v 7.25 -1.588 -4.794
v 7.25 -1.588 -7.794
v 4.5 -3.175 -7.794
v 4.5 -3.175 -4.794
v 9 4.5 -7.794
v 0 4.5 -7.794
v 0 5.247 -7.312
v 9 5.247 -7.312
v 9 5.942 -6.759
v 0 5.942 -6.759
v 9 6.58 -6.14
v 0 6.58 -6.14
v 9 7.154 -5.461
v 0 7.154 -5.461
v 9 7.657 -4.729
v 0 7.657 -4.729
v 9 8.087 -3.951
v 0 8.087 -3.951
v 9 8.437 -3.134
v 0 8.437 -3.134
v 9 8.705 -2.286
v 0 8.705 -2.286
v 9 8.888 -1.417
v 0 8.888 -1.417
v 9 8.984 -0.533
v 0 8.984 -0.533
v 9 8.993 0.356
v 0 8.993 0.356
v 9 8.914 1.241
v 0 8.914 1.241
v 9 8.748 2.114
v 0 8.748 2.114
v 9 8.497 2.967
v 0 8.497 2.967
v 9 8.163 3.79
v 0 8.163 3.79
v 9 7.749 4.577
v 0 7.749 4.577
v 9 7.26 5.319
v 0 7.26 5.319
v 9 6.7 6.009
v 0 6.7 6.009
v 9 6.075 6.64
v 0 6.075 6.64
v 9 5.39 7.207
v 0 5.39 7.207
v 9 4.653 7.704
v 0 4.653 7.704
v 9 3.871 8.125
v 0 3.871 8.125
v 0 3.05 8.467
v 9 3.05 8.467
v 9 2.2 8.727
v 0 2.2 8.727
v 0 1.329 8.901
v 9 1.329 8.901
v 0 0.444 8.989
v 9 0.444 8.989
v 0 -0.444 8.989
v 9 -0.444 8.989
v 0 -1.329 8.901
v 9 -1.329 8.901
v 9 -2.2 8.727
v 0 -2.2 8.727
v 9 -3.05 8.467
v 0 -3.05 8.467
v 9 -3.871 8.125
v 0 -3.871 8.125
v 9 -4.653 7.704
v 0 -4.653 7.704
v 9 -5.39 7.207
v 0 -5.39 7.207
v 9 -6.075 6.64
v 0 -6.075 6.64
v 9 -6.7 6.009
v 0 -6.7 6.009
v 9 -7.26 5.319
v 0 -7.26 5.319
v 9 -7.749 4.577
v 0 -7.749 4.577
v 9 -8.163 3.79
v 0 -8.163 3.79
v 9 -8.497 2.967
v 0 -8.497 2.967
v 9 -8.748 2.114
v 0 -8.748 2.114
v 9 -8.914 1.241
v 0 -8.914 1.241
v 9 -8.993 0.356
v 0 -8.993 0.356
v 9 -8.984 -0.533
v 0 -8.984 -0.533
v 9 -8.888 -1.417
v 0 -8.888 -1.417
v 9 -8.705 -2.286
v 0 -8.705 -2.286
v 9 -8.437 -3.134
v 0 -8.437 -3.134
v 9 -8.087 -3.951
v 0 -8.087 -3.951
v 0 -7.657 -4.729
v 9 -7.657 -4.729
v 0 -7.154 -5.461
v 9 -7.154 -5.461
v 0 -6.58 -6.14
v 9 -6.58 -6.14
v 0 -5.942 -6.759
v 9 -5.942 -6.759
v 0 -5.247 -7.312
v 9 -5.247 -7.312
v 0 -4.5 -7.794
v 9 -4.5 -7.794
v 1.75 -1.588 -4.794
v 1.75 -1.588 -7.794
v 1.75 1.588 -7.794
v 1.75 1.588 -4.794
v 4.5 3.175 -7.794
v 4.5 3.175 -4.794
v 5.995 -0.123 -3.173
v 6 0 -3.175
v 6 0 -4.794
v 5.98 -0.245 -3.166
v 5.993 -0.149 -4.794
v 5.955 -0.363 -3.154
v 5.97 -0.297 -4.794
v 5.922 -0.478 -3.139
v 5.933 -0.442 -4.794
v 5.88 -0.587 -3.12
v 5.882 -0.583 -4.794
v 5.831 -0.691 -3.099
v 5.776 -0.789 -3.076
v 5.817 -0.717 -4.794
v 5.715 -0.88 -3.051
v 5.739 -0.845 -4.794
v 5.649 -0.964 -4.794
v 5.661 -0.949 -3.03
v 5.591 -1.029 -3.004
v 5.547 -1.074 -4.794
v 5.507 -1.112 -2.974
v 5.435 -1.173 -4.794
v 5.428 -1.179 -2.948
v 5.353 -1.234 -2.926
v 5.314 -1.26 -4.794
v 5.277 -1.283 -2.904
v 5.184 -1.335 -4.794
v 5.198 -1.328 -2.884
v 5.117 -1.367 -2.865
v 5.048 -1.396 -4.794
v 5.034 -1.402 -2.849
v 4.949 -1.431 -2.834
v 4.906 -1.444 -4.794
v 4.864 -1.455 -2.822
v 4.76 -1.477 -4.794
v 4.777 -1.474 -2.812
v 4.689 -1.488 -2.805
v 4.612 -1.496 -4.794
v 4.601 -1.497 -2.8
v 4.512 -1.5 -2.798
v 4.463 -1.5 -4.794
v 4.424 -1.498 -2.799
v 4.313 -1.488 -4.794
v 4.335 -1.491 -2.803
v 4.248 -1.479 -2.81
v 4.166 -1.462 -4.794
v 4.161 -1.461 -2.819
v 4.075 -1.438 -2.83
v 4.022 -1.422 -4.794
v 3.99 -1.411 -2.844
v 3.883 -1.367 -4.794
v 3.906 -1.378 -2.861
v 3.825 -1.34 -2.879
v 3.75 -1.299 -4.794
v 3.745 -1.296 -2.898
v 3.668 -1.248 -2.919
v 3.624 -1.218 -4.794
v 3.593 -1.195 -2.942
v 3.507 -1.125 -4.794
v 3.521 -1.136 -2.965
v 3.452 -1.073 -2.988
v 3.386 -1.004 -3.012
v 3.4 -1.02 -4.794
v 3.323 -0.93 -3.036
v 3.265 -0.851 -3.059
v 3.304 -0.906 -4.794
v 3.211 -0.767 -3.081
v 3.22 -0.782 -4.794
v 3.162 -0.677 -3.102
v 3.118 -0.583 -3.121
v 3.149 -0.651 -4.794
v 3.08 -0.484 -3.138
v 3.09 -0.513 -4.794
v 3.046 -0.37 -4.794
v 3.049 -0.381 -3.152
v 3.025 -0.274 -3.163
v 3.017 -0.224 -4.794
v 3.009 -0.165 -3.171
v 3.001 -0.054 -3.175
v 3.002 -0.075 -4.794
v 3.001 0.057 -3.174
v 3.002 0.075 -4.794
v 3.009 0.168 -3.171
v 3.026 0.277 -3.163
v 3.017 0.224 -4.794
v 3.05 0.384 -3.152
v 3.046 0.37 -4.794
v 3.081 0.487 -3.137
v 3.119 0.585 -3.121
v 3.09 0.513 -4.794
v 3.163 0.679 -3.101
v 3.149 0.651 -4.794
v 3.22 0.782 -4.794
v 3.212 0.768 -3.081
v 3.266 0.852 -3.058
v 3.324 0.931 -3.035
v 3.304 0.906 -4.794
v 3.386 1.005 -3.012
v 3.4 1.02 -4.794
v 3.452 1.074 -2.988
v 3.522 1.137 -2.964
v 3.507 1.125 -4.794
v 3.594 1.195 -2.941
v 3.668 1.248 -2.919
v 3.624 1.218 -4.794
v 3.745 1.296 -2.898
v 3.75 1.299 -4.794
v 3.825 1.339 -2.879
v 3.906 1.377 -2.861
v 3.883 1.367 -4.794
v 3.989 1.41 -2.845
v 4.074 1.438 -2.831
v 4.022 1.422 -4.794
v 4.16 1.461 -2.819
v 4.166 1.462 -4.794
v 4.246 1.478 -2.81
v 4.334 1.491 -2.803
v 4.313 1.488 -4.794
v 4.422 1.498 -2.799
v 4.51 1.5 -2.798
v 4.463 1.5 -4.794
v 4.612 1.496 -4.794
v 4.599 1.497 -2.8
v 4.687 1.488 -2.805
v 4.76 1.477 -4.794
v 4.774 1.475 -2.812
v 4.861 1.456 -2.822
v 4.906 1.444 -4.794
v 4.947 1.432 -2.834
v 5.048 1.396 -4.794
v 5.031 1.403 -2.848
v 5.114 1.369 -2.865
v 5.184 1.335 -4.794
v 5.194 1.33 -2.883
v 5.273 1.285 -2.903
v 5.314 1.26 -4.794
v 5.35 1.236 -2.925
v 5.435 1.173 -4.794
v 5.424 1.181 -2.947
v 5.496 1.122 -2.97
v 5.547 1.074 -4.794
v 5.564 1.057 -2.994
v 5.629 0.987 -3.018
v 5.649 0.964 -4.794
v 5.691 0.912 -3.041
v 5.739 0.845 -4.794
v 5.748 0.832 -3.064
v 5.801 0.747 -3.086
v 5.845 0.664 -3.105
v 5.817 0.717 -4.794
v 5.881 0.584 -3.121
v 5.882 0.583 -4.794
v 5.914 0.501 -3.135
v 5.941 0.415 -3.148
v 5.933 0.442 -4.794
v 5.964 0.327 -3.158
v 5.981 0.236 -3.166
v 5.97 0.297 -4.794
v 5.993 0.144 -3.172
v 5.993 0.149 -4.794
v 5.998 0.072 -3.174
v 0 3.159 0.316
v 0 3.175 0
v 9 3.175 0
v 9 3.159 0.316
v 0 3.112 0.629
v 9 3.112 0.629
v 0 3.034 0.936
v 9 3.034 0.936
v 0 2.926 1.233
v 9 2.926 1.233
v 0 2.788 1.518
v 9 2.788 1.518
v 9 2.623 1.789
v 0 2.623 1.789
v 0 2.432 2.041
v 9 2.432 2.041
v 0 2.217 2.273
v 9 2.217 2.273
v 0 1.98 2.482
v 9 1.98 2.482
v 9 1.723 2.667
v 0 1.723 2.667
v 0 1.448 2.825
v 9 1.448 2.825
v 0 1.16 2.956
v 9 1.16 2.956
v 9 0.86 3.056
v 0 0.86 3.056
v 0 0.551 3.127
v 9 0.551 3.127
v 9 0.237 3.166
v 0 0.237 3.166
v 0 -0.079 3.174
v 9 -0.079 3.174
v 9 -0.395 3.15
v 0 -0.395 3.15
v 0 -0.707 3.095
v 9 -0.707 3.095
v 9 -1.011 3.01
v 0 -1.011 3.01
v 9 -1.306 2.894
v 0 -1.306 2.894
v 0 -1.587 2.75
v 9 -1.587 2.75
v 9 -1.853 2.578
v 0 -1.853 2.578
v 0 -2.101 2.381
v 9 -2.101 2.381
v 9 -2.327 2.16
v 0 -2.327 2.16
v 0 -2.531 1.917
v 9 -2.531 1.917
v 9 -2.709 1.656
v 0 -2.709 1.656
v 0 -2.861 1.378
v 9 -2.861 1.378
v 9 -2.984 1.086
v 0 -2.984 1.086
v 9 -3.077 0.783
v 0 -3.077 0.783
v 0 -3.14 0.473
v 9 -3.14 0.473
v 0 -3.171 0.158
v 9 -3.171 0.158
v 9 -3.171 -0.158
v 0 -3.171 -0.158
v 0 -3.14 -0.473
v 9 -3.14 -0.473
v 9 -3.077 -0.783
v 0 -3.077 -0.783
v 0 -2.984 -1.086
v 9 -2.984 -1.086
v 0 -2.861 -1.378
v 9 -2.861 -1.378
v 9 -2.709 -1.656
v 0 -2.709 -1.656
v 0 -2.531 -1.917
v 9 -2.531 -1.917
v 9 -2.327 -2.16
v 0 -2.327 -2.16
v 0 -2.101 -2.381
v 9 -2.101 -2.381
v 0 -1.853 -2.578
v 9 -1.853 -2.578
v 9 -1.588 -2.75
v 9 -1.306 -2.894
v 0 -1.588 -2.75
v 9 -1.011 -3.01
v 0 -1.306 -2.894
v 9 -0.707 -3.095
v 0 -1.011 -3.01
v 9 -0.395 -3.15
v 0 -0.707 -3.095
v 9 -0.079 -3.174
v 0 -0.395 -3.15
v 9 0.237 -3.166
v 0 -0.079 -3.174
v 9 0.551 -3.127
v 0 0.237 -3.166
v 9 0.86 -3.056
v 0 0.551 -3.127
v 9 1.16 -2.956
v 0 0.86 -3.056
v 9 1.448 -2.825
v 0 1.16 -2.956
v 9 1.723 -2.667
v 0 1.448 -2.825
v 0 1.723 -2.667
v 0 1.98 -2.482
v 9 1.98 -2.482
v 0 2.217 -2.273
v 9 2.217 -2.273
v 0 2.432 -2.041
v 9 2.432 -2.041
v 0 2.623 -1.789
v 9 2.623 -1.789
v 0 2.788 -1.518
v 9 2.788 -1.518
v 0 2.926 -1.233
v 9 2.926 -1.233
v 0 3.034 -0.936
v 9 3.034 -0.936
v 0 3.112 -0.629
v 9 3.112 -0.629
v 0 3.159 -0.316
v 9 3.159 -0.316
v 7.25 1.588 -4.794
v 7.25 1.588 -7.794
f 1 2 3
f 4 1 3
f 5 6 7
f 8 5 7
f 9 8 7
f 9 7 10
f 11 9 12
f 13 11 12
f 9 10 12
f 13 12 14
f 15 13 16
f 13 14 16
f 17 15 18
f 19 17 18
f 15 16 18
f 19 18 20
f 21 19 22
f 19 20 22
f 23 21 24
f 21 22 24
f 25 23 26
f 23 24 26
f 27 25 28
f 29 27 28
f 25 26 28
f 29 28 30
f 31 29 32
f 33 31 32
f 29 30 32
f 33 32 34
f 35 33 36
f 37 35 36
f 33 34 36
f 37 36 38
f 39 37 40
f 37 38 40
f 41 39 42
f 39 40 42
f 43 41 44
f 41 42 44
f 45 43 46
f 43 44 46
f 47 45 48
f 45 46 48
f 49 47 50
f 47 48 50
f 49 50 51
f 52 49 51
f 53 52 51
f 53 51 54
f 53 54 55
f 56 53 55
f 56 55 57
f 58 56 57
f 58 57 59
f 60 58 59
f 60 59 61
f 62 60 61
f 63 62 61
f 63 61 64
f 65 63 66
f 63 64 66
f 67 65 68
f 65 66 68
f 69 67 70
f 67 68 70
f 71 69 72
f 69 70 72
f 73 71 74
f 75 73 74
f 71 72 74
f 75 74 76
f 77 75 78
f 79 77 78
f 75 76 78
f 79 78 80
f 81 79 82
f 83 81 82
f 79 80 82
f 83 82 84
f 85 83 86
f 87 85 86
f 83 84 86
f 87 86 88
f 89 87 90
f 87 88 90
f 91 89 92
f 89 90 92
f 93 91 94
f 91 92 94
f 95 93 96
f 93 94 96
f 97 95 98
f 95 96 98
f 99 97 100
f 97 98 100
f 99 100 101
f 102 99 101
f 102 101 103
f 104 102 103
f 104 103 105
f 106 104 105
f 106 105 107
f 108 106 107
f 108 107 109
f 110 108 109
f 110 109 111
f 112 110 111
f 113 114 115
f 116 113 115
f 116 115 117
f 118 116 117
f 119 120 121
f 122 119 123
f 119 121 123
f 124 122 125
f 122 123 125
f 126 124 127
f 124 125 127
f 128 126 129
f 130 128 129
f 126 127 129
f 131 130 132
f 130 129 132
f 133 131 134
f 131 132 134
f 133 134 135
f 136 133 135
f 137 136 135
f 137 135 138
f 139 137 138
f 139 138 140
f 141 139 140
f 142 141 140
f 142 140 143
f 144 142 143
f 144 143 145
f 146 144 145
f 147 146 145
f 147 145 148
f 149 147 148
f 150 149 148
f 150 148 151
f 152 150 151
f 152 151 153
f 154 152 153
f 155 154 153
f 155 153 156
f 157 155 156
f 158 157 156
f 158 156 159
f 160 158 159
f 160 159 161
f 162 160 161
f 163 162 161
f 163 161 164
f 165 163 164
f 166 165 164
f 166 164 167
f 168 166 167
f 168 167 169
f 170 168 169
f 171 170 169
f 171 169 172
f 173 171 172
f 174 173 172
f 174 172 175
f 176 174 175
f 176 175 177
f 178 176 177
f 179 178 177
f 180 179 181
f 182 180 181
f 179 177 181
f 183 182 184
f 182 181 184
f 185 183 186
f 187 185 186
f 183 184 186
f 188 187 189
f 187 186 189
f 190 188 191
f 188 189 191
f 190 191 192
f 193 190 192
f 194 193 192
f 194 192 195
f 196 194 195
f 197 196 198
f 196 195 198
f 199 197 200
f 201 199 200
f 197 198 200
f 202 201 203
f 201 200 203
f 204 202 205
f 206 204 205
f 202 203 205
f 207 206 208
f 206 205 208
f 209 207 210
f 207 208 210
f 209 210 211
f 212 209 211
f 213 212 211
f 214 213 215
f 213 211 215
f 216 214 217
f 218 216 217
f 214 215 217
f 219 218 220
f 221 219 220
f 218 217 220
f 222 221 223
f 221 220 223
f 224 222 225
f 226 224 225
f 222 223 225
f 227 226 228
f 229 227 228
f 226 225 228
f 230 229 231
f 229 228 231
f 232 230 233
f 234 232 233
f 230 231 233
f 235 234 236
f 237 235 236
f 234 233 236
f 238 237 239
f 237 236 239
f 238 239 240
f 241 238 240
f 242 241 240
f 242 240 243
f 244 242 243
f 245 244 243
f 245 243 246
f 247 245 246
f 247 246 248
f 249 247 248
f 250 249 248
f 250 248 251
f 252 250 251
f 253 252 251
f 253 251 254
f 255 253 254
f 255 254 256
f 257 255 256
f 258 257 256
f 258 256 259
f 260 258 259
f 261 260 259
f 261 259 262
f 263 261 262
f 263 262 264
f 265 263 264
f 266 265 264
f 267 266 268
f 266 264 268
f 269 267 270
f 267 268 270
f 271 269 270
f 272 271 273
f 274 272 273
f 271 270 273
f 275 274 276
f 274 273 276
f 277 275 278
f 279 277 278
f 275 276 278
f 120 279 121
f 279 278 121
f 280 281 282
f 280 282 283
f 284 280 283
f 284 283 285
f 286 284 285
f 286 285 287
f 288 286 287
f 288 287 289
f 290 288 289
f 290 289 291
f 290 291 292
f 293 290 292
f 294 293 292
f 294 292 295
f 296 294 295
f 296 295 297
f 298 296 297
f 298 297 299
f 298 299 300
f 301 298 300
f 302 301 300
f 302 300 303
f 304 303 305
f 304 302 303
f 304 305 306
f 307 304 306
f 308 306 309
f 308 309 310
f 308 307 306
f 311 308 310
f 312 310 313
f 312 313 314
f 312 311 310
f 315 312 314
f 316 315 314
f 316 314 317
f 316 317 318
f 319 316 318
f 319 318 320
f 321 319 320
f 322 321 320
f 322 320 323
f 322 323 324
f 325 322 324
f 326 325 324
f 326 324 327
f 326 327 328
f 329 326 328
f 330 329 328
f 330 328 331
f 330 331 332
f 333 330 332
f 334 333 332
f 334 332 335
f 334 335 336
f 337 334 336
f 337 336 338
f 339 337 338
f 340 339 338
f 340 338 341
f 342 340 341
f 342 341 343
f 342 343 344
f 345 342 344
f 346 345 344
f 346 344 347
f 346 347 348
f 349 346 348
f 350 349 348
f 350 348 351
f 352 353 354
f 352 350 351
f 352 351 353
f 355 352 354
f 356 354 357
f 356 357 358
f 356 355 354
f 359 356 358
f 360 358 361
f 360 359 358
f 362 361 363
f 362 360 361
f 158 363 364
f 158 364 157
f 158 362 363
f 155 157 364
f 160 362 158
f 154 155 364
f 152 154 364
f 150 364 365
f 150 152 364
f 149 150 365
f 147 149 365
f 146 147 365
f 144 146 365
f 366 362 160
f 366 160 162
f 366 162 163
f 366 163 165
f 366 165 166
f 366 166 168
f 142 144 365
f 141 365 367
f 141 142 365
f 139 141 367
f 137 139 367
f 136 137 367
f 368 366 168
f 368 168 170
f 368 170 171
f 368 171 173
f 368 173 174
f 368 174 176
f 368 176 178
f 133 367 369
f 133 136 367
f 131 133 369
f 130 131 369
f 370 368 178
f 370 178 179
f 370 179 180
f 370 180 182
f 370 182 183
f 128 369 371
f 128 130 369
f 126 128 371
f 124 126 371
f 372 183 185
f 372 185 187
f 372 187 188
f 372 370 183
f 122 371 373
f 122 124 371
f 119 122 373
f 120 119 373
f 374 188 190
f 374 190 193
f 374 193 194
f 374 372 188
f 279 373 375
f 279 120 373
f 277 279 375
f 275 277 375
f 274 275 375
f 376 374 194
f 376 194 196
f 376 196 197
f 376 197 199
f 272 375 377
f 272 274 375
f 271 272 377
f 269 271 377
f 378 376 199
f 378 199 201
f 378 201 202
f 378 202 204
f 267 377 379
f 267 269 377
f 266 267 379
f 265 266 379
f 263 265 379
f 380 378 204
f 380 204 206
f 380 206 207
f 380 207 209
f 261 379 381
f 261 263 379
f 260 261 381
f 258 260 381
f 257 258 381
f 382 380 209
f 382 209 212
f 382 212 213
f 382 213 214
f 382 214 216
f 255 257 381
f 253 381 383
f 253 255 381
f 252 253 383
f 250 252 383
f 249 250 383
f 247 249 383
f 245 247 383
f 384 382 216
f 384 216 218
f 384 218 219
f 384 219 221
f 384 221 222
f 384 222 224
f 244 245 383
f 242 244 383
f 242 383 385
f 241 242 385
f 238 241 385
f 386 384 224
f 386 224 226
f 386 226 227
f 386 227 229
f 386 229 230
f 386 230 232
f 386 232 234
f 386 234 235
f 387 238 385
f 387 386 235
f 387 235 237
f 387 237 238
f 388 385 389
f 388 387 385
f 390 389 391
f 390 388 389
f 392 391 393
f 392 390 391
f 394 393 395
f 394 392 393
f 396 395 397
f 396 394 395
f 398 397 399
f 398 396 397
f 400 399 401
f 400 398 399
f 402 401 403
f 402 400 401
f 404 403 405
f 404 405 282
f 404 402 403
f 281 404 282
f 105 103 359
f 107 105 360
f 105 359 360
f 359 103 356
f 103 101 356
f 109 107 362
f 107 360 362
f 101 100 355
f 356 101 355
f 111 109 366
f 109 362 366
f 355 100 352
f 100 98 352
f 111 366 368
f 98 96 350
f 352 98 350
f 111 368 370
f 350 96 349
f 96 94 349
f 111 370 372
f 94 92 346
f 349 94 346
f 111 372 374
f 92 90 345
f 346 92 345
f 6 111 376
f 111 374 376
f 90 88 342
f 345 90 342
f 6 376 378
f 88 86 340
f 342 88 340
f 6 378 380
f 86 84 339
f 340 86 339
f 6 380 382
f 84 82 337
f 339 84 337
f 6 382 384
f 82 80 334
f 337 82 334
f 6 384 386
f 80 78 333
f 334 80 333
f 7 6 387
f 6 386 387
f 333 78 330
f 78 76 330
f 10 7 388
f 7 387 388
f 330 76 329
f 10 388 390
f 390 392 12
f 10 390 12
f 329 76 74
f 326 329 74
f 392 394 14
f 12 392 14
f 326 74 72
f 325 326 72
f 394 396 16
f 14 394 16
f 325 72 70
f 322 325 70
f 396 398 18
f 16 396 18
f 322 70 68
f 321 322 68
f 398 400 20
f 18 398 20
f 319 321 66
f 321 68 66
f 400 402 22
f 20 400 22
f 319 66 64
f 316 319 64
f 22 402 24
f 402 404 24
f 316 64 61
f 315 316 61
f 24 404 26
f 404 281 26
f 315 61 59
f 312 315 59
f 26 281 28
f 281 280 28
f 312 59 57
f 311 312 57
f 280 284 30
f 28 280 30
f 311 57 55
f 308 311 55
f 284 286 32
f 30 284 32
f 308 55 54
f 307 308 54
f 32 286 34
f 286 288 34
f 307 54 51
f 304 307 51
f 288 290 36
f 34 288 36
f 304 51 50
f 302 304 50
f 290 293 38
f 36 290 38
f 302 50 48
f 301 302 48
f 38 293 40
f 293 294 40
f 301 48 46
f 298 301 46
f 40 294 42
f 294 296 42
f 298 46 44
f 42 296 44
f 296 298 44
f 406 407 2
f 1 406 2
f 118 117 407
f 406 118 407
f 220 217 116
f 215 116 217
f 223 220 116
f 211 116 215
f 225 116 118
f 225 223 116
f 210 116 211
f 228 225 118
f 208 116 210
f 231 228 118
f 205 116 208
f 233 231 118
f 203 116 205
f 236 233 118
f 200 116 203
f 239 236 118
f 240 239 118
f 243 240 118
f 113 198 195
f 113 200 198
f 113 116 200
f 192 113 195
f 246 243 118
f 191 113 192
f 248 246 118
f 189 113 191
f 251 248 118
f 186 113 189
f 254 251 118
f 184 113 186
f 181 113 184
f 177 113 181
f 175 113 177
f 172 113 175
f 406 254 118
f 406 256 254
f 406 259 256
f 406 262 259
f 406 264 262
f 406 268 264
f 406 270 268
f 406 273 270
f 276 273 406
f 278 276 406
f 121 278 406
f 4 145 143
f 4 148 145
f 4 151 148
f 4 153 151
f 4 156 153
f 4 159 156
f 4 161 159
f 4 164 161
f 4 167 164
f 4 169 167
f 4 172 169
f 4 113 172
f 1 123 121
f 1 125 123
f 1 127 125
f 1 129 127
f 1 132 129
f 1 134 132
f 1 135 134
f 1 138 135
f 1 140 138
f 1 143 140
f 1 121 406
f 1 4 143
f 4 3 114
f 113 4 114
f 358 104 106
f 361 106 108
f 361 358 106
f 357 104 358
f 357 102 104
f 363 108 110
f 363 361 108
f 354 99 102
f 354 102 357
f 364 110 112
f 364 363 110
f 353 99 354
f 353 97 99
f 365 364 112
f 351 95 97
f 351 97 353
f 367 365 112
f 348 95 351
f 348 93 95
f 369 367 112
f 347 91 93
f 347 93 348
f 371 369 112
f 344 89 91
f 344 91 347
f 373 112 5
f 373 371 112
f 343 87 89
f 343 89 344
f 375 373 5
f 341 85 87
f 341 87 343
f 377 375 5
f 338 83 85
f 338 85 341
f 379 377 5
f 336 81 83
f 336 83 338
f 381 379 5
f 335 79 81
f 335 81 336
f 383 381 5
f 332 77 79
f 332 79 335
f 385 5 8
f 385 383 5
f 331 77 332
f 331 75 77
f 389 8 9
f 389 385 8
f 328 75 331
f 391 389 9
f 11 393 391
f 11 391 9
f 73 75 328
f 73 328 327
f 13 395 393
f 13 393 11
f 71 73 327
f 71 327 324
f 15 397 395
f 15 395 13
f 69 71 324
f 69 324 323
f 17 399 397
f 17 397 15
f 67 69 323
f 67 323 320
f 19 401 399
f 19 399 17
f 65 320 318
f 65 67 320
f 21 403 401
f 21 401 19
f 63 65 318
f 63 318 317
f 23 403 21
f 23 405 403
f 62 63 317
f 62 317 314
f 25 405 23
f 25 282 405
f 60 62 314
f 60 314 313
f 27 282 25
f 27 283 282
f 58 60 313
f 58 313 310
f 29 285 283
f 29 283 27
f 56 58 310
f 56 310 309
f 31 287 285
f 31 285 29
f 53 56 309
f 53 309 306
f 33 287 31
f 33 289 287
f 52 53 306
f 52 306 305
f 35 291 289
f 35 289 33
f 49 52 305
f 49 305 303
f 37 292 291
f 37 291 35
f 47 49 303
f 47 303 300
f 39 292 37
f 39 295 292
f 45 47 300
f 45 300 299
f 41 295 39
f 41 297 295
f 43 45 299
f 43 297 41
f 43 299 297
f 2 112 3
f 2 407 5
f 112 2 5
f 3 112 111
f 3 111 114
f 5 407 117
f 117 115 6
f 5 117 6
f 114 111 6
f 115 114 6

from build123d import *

# Parameters (mm, degrees)
F0_R     = 3.175
F1_DEPTH = 9
F3_DEPTH = 3
F4_R     = 1.5
F5_DEPTH = 6


with BuildPart() as f1:
    # F0 (on Right) → F1 (new body)
    with BuildSketch(Plane.YZ):
        with BuildLine():
            ThreePointArc((4.5, -7.794229), (0, 9), (-4.5, -7.794229))
            Line((-4.5, -7.794229), (4.5, -7.794229))
        make_face()
        Circle(F0_R, mode=Mode.SUBTRACT)
    extrude(amount=F1_DEPTH)

    # F2 (on face) → F3 (cut)
    with BuildSketch(Plane(origin=(0, 0, -7.794229), x_dir=(1, 0, 0), z_dir=(0, 0, -1))):
        Polygon((1.75, 1.587713), (1.75, -1.587713), (4.5, -3.175426), (7.25, -1.587713), (7.25, 1.587713), (4.5, 3.175426), align=None)
    extrude(amount=-F3_DEPTH, mode=Mode.SUBTRACT)

    # F4 (on face) → F5 (cut)
    with BuildSketch(Plane(origin=(0, 0, -7.794229), x_dir=(1, 0, 0), z_dir=(0, 0, -1))):
        with Locations((4.5, 0)):
            Circle(F4_R)
    extrude(amount=-F5_DEPTH, mode=Mode.SUBTRACT)


solid = f1.part
